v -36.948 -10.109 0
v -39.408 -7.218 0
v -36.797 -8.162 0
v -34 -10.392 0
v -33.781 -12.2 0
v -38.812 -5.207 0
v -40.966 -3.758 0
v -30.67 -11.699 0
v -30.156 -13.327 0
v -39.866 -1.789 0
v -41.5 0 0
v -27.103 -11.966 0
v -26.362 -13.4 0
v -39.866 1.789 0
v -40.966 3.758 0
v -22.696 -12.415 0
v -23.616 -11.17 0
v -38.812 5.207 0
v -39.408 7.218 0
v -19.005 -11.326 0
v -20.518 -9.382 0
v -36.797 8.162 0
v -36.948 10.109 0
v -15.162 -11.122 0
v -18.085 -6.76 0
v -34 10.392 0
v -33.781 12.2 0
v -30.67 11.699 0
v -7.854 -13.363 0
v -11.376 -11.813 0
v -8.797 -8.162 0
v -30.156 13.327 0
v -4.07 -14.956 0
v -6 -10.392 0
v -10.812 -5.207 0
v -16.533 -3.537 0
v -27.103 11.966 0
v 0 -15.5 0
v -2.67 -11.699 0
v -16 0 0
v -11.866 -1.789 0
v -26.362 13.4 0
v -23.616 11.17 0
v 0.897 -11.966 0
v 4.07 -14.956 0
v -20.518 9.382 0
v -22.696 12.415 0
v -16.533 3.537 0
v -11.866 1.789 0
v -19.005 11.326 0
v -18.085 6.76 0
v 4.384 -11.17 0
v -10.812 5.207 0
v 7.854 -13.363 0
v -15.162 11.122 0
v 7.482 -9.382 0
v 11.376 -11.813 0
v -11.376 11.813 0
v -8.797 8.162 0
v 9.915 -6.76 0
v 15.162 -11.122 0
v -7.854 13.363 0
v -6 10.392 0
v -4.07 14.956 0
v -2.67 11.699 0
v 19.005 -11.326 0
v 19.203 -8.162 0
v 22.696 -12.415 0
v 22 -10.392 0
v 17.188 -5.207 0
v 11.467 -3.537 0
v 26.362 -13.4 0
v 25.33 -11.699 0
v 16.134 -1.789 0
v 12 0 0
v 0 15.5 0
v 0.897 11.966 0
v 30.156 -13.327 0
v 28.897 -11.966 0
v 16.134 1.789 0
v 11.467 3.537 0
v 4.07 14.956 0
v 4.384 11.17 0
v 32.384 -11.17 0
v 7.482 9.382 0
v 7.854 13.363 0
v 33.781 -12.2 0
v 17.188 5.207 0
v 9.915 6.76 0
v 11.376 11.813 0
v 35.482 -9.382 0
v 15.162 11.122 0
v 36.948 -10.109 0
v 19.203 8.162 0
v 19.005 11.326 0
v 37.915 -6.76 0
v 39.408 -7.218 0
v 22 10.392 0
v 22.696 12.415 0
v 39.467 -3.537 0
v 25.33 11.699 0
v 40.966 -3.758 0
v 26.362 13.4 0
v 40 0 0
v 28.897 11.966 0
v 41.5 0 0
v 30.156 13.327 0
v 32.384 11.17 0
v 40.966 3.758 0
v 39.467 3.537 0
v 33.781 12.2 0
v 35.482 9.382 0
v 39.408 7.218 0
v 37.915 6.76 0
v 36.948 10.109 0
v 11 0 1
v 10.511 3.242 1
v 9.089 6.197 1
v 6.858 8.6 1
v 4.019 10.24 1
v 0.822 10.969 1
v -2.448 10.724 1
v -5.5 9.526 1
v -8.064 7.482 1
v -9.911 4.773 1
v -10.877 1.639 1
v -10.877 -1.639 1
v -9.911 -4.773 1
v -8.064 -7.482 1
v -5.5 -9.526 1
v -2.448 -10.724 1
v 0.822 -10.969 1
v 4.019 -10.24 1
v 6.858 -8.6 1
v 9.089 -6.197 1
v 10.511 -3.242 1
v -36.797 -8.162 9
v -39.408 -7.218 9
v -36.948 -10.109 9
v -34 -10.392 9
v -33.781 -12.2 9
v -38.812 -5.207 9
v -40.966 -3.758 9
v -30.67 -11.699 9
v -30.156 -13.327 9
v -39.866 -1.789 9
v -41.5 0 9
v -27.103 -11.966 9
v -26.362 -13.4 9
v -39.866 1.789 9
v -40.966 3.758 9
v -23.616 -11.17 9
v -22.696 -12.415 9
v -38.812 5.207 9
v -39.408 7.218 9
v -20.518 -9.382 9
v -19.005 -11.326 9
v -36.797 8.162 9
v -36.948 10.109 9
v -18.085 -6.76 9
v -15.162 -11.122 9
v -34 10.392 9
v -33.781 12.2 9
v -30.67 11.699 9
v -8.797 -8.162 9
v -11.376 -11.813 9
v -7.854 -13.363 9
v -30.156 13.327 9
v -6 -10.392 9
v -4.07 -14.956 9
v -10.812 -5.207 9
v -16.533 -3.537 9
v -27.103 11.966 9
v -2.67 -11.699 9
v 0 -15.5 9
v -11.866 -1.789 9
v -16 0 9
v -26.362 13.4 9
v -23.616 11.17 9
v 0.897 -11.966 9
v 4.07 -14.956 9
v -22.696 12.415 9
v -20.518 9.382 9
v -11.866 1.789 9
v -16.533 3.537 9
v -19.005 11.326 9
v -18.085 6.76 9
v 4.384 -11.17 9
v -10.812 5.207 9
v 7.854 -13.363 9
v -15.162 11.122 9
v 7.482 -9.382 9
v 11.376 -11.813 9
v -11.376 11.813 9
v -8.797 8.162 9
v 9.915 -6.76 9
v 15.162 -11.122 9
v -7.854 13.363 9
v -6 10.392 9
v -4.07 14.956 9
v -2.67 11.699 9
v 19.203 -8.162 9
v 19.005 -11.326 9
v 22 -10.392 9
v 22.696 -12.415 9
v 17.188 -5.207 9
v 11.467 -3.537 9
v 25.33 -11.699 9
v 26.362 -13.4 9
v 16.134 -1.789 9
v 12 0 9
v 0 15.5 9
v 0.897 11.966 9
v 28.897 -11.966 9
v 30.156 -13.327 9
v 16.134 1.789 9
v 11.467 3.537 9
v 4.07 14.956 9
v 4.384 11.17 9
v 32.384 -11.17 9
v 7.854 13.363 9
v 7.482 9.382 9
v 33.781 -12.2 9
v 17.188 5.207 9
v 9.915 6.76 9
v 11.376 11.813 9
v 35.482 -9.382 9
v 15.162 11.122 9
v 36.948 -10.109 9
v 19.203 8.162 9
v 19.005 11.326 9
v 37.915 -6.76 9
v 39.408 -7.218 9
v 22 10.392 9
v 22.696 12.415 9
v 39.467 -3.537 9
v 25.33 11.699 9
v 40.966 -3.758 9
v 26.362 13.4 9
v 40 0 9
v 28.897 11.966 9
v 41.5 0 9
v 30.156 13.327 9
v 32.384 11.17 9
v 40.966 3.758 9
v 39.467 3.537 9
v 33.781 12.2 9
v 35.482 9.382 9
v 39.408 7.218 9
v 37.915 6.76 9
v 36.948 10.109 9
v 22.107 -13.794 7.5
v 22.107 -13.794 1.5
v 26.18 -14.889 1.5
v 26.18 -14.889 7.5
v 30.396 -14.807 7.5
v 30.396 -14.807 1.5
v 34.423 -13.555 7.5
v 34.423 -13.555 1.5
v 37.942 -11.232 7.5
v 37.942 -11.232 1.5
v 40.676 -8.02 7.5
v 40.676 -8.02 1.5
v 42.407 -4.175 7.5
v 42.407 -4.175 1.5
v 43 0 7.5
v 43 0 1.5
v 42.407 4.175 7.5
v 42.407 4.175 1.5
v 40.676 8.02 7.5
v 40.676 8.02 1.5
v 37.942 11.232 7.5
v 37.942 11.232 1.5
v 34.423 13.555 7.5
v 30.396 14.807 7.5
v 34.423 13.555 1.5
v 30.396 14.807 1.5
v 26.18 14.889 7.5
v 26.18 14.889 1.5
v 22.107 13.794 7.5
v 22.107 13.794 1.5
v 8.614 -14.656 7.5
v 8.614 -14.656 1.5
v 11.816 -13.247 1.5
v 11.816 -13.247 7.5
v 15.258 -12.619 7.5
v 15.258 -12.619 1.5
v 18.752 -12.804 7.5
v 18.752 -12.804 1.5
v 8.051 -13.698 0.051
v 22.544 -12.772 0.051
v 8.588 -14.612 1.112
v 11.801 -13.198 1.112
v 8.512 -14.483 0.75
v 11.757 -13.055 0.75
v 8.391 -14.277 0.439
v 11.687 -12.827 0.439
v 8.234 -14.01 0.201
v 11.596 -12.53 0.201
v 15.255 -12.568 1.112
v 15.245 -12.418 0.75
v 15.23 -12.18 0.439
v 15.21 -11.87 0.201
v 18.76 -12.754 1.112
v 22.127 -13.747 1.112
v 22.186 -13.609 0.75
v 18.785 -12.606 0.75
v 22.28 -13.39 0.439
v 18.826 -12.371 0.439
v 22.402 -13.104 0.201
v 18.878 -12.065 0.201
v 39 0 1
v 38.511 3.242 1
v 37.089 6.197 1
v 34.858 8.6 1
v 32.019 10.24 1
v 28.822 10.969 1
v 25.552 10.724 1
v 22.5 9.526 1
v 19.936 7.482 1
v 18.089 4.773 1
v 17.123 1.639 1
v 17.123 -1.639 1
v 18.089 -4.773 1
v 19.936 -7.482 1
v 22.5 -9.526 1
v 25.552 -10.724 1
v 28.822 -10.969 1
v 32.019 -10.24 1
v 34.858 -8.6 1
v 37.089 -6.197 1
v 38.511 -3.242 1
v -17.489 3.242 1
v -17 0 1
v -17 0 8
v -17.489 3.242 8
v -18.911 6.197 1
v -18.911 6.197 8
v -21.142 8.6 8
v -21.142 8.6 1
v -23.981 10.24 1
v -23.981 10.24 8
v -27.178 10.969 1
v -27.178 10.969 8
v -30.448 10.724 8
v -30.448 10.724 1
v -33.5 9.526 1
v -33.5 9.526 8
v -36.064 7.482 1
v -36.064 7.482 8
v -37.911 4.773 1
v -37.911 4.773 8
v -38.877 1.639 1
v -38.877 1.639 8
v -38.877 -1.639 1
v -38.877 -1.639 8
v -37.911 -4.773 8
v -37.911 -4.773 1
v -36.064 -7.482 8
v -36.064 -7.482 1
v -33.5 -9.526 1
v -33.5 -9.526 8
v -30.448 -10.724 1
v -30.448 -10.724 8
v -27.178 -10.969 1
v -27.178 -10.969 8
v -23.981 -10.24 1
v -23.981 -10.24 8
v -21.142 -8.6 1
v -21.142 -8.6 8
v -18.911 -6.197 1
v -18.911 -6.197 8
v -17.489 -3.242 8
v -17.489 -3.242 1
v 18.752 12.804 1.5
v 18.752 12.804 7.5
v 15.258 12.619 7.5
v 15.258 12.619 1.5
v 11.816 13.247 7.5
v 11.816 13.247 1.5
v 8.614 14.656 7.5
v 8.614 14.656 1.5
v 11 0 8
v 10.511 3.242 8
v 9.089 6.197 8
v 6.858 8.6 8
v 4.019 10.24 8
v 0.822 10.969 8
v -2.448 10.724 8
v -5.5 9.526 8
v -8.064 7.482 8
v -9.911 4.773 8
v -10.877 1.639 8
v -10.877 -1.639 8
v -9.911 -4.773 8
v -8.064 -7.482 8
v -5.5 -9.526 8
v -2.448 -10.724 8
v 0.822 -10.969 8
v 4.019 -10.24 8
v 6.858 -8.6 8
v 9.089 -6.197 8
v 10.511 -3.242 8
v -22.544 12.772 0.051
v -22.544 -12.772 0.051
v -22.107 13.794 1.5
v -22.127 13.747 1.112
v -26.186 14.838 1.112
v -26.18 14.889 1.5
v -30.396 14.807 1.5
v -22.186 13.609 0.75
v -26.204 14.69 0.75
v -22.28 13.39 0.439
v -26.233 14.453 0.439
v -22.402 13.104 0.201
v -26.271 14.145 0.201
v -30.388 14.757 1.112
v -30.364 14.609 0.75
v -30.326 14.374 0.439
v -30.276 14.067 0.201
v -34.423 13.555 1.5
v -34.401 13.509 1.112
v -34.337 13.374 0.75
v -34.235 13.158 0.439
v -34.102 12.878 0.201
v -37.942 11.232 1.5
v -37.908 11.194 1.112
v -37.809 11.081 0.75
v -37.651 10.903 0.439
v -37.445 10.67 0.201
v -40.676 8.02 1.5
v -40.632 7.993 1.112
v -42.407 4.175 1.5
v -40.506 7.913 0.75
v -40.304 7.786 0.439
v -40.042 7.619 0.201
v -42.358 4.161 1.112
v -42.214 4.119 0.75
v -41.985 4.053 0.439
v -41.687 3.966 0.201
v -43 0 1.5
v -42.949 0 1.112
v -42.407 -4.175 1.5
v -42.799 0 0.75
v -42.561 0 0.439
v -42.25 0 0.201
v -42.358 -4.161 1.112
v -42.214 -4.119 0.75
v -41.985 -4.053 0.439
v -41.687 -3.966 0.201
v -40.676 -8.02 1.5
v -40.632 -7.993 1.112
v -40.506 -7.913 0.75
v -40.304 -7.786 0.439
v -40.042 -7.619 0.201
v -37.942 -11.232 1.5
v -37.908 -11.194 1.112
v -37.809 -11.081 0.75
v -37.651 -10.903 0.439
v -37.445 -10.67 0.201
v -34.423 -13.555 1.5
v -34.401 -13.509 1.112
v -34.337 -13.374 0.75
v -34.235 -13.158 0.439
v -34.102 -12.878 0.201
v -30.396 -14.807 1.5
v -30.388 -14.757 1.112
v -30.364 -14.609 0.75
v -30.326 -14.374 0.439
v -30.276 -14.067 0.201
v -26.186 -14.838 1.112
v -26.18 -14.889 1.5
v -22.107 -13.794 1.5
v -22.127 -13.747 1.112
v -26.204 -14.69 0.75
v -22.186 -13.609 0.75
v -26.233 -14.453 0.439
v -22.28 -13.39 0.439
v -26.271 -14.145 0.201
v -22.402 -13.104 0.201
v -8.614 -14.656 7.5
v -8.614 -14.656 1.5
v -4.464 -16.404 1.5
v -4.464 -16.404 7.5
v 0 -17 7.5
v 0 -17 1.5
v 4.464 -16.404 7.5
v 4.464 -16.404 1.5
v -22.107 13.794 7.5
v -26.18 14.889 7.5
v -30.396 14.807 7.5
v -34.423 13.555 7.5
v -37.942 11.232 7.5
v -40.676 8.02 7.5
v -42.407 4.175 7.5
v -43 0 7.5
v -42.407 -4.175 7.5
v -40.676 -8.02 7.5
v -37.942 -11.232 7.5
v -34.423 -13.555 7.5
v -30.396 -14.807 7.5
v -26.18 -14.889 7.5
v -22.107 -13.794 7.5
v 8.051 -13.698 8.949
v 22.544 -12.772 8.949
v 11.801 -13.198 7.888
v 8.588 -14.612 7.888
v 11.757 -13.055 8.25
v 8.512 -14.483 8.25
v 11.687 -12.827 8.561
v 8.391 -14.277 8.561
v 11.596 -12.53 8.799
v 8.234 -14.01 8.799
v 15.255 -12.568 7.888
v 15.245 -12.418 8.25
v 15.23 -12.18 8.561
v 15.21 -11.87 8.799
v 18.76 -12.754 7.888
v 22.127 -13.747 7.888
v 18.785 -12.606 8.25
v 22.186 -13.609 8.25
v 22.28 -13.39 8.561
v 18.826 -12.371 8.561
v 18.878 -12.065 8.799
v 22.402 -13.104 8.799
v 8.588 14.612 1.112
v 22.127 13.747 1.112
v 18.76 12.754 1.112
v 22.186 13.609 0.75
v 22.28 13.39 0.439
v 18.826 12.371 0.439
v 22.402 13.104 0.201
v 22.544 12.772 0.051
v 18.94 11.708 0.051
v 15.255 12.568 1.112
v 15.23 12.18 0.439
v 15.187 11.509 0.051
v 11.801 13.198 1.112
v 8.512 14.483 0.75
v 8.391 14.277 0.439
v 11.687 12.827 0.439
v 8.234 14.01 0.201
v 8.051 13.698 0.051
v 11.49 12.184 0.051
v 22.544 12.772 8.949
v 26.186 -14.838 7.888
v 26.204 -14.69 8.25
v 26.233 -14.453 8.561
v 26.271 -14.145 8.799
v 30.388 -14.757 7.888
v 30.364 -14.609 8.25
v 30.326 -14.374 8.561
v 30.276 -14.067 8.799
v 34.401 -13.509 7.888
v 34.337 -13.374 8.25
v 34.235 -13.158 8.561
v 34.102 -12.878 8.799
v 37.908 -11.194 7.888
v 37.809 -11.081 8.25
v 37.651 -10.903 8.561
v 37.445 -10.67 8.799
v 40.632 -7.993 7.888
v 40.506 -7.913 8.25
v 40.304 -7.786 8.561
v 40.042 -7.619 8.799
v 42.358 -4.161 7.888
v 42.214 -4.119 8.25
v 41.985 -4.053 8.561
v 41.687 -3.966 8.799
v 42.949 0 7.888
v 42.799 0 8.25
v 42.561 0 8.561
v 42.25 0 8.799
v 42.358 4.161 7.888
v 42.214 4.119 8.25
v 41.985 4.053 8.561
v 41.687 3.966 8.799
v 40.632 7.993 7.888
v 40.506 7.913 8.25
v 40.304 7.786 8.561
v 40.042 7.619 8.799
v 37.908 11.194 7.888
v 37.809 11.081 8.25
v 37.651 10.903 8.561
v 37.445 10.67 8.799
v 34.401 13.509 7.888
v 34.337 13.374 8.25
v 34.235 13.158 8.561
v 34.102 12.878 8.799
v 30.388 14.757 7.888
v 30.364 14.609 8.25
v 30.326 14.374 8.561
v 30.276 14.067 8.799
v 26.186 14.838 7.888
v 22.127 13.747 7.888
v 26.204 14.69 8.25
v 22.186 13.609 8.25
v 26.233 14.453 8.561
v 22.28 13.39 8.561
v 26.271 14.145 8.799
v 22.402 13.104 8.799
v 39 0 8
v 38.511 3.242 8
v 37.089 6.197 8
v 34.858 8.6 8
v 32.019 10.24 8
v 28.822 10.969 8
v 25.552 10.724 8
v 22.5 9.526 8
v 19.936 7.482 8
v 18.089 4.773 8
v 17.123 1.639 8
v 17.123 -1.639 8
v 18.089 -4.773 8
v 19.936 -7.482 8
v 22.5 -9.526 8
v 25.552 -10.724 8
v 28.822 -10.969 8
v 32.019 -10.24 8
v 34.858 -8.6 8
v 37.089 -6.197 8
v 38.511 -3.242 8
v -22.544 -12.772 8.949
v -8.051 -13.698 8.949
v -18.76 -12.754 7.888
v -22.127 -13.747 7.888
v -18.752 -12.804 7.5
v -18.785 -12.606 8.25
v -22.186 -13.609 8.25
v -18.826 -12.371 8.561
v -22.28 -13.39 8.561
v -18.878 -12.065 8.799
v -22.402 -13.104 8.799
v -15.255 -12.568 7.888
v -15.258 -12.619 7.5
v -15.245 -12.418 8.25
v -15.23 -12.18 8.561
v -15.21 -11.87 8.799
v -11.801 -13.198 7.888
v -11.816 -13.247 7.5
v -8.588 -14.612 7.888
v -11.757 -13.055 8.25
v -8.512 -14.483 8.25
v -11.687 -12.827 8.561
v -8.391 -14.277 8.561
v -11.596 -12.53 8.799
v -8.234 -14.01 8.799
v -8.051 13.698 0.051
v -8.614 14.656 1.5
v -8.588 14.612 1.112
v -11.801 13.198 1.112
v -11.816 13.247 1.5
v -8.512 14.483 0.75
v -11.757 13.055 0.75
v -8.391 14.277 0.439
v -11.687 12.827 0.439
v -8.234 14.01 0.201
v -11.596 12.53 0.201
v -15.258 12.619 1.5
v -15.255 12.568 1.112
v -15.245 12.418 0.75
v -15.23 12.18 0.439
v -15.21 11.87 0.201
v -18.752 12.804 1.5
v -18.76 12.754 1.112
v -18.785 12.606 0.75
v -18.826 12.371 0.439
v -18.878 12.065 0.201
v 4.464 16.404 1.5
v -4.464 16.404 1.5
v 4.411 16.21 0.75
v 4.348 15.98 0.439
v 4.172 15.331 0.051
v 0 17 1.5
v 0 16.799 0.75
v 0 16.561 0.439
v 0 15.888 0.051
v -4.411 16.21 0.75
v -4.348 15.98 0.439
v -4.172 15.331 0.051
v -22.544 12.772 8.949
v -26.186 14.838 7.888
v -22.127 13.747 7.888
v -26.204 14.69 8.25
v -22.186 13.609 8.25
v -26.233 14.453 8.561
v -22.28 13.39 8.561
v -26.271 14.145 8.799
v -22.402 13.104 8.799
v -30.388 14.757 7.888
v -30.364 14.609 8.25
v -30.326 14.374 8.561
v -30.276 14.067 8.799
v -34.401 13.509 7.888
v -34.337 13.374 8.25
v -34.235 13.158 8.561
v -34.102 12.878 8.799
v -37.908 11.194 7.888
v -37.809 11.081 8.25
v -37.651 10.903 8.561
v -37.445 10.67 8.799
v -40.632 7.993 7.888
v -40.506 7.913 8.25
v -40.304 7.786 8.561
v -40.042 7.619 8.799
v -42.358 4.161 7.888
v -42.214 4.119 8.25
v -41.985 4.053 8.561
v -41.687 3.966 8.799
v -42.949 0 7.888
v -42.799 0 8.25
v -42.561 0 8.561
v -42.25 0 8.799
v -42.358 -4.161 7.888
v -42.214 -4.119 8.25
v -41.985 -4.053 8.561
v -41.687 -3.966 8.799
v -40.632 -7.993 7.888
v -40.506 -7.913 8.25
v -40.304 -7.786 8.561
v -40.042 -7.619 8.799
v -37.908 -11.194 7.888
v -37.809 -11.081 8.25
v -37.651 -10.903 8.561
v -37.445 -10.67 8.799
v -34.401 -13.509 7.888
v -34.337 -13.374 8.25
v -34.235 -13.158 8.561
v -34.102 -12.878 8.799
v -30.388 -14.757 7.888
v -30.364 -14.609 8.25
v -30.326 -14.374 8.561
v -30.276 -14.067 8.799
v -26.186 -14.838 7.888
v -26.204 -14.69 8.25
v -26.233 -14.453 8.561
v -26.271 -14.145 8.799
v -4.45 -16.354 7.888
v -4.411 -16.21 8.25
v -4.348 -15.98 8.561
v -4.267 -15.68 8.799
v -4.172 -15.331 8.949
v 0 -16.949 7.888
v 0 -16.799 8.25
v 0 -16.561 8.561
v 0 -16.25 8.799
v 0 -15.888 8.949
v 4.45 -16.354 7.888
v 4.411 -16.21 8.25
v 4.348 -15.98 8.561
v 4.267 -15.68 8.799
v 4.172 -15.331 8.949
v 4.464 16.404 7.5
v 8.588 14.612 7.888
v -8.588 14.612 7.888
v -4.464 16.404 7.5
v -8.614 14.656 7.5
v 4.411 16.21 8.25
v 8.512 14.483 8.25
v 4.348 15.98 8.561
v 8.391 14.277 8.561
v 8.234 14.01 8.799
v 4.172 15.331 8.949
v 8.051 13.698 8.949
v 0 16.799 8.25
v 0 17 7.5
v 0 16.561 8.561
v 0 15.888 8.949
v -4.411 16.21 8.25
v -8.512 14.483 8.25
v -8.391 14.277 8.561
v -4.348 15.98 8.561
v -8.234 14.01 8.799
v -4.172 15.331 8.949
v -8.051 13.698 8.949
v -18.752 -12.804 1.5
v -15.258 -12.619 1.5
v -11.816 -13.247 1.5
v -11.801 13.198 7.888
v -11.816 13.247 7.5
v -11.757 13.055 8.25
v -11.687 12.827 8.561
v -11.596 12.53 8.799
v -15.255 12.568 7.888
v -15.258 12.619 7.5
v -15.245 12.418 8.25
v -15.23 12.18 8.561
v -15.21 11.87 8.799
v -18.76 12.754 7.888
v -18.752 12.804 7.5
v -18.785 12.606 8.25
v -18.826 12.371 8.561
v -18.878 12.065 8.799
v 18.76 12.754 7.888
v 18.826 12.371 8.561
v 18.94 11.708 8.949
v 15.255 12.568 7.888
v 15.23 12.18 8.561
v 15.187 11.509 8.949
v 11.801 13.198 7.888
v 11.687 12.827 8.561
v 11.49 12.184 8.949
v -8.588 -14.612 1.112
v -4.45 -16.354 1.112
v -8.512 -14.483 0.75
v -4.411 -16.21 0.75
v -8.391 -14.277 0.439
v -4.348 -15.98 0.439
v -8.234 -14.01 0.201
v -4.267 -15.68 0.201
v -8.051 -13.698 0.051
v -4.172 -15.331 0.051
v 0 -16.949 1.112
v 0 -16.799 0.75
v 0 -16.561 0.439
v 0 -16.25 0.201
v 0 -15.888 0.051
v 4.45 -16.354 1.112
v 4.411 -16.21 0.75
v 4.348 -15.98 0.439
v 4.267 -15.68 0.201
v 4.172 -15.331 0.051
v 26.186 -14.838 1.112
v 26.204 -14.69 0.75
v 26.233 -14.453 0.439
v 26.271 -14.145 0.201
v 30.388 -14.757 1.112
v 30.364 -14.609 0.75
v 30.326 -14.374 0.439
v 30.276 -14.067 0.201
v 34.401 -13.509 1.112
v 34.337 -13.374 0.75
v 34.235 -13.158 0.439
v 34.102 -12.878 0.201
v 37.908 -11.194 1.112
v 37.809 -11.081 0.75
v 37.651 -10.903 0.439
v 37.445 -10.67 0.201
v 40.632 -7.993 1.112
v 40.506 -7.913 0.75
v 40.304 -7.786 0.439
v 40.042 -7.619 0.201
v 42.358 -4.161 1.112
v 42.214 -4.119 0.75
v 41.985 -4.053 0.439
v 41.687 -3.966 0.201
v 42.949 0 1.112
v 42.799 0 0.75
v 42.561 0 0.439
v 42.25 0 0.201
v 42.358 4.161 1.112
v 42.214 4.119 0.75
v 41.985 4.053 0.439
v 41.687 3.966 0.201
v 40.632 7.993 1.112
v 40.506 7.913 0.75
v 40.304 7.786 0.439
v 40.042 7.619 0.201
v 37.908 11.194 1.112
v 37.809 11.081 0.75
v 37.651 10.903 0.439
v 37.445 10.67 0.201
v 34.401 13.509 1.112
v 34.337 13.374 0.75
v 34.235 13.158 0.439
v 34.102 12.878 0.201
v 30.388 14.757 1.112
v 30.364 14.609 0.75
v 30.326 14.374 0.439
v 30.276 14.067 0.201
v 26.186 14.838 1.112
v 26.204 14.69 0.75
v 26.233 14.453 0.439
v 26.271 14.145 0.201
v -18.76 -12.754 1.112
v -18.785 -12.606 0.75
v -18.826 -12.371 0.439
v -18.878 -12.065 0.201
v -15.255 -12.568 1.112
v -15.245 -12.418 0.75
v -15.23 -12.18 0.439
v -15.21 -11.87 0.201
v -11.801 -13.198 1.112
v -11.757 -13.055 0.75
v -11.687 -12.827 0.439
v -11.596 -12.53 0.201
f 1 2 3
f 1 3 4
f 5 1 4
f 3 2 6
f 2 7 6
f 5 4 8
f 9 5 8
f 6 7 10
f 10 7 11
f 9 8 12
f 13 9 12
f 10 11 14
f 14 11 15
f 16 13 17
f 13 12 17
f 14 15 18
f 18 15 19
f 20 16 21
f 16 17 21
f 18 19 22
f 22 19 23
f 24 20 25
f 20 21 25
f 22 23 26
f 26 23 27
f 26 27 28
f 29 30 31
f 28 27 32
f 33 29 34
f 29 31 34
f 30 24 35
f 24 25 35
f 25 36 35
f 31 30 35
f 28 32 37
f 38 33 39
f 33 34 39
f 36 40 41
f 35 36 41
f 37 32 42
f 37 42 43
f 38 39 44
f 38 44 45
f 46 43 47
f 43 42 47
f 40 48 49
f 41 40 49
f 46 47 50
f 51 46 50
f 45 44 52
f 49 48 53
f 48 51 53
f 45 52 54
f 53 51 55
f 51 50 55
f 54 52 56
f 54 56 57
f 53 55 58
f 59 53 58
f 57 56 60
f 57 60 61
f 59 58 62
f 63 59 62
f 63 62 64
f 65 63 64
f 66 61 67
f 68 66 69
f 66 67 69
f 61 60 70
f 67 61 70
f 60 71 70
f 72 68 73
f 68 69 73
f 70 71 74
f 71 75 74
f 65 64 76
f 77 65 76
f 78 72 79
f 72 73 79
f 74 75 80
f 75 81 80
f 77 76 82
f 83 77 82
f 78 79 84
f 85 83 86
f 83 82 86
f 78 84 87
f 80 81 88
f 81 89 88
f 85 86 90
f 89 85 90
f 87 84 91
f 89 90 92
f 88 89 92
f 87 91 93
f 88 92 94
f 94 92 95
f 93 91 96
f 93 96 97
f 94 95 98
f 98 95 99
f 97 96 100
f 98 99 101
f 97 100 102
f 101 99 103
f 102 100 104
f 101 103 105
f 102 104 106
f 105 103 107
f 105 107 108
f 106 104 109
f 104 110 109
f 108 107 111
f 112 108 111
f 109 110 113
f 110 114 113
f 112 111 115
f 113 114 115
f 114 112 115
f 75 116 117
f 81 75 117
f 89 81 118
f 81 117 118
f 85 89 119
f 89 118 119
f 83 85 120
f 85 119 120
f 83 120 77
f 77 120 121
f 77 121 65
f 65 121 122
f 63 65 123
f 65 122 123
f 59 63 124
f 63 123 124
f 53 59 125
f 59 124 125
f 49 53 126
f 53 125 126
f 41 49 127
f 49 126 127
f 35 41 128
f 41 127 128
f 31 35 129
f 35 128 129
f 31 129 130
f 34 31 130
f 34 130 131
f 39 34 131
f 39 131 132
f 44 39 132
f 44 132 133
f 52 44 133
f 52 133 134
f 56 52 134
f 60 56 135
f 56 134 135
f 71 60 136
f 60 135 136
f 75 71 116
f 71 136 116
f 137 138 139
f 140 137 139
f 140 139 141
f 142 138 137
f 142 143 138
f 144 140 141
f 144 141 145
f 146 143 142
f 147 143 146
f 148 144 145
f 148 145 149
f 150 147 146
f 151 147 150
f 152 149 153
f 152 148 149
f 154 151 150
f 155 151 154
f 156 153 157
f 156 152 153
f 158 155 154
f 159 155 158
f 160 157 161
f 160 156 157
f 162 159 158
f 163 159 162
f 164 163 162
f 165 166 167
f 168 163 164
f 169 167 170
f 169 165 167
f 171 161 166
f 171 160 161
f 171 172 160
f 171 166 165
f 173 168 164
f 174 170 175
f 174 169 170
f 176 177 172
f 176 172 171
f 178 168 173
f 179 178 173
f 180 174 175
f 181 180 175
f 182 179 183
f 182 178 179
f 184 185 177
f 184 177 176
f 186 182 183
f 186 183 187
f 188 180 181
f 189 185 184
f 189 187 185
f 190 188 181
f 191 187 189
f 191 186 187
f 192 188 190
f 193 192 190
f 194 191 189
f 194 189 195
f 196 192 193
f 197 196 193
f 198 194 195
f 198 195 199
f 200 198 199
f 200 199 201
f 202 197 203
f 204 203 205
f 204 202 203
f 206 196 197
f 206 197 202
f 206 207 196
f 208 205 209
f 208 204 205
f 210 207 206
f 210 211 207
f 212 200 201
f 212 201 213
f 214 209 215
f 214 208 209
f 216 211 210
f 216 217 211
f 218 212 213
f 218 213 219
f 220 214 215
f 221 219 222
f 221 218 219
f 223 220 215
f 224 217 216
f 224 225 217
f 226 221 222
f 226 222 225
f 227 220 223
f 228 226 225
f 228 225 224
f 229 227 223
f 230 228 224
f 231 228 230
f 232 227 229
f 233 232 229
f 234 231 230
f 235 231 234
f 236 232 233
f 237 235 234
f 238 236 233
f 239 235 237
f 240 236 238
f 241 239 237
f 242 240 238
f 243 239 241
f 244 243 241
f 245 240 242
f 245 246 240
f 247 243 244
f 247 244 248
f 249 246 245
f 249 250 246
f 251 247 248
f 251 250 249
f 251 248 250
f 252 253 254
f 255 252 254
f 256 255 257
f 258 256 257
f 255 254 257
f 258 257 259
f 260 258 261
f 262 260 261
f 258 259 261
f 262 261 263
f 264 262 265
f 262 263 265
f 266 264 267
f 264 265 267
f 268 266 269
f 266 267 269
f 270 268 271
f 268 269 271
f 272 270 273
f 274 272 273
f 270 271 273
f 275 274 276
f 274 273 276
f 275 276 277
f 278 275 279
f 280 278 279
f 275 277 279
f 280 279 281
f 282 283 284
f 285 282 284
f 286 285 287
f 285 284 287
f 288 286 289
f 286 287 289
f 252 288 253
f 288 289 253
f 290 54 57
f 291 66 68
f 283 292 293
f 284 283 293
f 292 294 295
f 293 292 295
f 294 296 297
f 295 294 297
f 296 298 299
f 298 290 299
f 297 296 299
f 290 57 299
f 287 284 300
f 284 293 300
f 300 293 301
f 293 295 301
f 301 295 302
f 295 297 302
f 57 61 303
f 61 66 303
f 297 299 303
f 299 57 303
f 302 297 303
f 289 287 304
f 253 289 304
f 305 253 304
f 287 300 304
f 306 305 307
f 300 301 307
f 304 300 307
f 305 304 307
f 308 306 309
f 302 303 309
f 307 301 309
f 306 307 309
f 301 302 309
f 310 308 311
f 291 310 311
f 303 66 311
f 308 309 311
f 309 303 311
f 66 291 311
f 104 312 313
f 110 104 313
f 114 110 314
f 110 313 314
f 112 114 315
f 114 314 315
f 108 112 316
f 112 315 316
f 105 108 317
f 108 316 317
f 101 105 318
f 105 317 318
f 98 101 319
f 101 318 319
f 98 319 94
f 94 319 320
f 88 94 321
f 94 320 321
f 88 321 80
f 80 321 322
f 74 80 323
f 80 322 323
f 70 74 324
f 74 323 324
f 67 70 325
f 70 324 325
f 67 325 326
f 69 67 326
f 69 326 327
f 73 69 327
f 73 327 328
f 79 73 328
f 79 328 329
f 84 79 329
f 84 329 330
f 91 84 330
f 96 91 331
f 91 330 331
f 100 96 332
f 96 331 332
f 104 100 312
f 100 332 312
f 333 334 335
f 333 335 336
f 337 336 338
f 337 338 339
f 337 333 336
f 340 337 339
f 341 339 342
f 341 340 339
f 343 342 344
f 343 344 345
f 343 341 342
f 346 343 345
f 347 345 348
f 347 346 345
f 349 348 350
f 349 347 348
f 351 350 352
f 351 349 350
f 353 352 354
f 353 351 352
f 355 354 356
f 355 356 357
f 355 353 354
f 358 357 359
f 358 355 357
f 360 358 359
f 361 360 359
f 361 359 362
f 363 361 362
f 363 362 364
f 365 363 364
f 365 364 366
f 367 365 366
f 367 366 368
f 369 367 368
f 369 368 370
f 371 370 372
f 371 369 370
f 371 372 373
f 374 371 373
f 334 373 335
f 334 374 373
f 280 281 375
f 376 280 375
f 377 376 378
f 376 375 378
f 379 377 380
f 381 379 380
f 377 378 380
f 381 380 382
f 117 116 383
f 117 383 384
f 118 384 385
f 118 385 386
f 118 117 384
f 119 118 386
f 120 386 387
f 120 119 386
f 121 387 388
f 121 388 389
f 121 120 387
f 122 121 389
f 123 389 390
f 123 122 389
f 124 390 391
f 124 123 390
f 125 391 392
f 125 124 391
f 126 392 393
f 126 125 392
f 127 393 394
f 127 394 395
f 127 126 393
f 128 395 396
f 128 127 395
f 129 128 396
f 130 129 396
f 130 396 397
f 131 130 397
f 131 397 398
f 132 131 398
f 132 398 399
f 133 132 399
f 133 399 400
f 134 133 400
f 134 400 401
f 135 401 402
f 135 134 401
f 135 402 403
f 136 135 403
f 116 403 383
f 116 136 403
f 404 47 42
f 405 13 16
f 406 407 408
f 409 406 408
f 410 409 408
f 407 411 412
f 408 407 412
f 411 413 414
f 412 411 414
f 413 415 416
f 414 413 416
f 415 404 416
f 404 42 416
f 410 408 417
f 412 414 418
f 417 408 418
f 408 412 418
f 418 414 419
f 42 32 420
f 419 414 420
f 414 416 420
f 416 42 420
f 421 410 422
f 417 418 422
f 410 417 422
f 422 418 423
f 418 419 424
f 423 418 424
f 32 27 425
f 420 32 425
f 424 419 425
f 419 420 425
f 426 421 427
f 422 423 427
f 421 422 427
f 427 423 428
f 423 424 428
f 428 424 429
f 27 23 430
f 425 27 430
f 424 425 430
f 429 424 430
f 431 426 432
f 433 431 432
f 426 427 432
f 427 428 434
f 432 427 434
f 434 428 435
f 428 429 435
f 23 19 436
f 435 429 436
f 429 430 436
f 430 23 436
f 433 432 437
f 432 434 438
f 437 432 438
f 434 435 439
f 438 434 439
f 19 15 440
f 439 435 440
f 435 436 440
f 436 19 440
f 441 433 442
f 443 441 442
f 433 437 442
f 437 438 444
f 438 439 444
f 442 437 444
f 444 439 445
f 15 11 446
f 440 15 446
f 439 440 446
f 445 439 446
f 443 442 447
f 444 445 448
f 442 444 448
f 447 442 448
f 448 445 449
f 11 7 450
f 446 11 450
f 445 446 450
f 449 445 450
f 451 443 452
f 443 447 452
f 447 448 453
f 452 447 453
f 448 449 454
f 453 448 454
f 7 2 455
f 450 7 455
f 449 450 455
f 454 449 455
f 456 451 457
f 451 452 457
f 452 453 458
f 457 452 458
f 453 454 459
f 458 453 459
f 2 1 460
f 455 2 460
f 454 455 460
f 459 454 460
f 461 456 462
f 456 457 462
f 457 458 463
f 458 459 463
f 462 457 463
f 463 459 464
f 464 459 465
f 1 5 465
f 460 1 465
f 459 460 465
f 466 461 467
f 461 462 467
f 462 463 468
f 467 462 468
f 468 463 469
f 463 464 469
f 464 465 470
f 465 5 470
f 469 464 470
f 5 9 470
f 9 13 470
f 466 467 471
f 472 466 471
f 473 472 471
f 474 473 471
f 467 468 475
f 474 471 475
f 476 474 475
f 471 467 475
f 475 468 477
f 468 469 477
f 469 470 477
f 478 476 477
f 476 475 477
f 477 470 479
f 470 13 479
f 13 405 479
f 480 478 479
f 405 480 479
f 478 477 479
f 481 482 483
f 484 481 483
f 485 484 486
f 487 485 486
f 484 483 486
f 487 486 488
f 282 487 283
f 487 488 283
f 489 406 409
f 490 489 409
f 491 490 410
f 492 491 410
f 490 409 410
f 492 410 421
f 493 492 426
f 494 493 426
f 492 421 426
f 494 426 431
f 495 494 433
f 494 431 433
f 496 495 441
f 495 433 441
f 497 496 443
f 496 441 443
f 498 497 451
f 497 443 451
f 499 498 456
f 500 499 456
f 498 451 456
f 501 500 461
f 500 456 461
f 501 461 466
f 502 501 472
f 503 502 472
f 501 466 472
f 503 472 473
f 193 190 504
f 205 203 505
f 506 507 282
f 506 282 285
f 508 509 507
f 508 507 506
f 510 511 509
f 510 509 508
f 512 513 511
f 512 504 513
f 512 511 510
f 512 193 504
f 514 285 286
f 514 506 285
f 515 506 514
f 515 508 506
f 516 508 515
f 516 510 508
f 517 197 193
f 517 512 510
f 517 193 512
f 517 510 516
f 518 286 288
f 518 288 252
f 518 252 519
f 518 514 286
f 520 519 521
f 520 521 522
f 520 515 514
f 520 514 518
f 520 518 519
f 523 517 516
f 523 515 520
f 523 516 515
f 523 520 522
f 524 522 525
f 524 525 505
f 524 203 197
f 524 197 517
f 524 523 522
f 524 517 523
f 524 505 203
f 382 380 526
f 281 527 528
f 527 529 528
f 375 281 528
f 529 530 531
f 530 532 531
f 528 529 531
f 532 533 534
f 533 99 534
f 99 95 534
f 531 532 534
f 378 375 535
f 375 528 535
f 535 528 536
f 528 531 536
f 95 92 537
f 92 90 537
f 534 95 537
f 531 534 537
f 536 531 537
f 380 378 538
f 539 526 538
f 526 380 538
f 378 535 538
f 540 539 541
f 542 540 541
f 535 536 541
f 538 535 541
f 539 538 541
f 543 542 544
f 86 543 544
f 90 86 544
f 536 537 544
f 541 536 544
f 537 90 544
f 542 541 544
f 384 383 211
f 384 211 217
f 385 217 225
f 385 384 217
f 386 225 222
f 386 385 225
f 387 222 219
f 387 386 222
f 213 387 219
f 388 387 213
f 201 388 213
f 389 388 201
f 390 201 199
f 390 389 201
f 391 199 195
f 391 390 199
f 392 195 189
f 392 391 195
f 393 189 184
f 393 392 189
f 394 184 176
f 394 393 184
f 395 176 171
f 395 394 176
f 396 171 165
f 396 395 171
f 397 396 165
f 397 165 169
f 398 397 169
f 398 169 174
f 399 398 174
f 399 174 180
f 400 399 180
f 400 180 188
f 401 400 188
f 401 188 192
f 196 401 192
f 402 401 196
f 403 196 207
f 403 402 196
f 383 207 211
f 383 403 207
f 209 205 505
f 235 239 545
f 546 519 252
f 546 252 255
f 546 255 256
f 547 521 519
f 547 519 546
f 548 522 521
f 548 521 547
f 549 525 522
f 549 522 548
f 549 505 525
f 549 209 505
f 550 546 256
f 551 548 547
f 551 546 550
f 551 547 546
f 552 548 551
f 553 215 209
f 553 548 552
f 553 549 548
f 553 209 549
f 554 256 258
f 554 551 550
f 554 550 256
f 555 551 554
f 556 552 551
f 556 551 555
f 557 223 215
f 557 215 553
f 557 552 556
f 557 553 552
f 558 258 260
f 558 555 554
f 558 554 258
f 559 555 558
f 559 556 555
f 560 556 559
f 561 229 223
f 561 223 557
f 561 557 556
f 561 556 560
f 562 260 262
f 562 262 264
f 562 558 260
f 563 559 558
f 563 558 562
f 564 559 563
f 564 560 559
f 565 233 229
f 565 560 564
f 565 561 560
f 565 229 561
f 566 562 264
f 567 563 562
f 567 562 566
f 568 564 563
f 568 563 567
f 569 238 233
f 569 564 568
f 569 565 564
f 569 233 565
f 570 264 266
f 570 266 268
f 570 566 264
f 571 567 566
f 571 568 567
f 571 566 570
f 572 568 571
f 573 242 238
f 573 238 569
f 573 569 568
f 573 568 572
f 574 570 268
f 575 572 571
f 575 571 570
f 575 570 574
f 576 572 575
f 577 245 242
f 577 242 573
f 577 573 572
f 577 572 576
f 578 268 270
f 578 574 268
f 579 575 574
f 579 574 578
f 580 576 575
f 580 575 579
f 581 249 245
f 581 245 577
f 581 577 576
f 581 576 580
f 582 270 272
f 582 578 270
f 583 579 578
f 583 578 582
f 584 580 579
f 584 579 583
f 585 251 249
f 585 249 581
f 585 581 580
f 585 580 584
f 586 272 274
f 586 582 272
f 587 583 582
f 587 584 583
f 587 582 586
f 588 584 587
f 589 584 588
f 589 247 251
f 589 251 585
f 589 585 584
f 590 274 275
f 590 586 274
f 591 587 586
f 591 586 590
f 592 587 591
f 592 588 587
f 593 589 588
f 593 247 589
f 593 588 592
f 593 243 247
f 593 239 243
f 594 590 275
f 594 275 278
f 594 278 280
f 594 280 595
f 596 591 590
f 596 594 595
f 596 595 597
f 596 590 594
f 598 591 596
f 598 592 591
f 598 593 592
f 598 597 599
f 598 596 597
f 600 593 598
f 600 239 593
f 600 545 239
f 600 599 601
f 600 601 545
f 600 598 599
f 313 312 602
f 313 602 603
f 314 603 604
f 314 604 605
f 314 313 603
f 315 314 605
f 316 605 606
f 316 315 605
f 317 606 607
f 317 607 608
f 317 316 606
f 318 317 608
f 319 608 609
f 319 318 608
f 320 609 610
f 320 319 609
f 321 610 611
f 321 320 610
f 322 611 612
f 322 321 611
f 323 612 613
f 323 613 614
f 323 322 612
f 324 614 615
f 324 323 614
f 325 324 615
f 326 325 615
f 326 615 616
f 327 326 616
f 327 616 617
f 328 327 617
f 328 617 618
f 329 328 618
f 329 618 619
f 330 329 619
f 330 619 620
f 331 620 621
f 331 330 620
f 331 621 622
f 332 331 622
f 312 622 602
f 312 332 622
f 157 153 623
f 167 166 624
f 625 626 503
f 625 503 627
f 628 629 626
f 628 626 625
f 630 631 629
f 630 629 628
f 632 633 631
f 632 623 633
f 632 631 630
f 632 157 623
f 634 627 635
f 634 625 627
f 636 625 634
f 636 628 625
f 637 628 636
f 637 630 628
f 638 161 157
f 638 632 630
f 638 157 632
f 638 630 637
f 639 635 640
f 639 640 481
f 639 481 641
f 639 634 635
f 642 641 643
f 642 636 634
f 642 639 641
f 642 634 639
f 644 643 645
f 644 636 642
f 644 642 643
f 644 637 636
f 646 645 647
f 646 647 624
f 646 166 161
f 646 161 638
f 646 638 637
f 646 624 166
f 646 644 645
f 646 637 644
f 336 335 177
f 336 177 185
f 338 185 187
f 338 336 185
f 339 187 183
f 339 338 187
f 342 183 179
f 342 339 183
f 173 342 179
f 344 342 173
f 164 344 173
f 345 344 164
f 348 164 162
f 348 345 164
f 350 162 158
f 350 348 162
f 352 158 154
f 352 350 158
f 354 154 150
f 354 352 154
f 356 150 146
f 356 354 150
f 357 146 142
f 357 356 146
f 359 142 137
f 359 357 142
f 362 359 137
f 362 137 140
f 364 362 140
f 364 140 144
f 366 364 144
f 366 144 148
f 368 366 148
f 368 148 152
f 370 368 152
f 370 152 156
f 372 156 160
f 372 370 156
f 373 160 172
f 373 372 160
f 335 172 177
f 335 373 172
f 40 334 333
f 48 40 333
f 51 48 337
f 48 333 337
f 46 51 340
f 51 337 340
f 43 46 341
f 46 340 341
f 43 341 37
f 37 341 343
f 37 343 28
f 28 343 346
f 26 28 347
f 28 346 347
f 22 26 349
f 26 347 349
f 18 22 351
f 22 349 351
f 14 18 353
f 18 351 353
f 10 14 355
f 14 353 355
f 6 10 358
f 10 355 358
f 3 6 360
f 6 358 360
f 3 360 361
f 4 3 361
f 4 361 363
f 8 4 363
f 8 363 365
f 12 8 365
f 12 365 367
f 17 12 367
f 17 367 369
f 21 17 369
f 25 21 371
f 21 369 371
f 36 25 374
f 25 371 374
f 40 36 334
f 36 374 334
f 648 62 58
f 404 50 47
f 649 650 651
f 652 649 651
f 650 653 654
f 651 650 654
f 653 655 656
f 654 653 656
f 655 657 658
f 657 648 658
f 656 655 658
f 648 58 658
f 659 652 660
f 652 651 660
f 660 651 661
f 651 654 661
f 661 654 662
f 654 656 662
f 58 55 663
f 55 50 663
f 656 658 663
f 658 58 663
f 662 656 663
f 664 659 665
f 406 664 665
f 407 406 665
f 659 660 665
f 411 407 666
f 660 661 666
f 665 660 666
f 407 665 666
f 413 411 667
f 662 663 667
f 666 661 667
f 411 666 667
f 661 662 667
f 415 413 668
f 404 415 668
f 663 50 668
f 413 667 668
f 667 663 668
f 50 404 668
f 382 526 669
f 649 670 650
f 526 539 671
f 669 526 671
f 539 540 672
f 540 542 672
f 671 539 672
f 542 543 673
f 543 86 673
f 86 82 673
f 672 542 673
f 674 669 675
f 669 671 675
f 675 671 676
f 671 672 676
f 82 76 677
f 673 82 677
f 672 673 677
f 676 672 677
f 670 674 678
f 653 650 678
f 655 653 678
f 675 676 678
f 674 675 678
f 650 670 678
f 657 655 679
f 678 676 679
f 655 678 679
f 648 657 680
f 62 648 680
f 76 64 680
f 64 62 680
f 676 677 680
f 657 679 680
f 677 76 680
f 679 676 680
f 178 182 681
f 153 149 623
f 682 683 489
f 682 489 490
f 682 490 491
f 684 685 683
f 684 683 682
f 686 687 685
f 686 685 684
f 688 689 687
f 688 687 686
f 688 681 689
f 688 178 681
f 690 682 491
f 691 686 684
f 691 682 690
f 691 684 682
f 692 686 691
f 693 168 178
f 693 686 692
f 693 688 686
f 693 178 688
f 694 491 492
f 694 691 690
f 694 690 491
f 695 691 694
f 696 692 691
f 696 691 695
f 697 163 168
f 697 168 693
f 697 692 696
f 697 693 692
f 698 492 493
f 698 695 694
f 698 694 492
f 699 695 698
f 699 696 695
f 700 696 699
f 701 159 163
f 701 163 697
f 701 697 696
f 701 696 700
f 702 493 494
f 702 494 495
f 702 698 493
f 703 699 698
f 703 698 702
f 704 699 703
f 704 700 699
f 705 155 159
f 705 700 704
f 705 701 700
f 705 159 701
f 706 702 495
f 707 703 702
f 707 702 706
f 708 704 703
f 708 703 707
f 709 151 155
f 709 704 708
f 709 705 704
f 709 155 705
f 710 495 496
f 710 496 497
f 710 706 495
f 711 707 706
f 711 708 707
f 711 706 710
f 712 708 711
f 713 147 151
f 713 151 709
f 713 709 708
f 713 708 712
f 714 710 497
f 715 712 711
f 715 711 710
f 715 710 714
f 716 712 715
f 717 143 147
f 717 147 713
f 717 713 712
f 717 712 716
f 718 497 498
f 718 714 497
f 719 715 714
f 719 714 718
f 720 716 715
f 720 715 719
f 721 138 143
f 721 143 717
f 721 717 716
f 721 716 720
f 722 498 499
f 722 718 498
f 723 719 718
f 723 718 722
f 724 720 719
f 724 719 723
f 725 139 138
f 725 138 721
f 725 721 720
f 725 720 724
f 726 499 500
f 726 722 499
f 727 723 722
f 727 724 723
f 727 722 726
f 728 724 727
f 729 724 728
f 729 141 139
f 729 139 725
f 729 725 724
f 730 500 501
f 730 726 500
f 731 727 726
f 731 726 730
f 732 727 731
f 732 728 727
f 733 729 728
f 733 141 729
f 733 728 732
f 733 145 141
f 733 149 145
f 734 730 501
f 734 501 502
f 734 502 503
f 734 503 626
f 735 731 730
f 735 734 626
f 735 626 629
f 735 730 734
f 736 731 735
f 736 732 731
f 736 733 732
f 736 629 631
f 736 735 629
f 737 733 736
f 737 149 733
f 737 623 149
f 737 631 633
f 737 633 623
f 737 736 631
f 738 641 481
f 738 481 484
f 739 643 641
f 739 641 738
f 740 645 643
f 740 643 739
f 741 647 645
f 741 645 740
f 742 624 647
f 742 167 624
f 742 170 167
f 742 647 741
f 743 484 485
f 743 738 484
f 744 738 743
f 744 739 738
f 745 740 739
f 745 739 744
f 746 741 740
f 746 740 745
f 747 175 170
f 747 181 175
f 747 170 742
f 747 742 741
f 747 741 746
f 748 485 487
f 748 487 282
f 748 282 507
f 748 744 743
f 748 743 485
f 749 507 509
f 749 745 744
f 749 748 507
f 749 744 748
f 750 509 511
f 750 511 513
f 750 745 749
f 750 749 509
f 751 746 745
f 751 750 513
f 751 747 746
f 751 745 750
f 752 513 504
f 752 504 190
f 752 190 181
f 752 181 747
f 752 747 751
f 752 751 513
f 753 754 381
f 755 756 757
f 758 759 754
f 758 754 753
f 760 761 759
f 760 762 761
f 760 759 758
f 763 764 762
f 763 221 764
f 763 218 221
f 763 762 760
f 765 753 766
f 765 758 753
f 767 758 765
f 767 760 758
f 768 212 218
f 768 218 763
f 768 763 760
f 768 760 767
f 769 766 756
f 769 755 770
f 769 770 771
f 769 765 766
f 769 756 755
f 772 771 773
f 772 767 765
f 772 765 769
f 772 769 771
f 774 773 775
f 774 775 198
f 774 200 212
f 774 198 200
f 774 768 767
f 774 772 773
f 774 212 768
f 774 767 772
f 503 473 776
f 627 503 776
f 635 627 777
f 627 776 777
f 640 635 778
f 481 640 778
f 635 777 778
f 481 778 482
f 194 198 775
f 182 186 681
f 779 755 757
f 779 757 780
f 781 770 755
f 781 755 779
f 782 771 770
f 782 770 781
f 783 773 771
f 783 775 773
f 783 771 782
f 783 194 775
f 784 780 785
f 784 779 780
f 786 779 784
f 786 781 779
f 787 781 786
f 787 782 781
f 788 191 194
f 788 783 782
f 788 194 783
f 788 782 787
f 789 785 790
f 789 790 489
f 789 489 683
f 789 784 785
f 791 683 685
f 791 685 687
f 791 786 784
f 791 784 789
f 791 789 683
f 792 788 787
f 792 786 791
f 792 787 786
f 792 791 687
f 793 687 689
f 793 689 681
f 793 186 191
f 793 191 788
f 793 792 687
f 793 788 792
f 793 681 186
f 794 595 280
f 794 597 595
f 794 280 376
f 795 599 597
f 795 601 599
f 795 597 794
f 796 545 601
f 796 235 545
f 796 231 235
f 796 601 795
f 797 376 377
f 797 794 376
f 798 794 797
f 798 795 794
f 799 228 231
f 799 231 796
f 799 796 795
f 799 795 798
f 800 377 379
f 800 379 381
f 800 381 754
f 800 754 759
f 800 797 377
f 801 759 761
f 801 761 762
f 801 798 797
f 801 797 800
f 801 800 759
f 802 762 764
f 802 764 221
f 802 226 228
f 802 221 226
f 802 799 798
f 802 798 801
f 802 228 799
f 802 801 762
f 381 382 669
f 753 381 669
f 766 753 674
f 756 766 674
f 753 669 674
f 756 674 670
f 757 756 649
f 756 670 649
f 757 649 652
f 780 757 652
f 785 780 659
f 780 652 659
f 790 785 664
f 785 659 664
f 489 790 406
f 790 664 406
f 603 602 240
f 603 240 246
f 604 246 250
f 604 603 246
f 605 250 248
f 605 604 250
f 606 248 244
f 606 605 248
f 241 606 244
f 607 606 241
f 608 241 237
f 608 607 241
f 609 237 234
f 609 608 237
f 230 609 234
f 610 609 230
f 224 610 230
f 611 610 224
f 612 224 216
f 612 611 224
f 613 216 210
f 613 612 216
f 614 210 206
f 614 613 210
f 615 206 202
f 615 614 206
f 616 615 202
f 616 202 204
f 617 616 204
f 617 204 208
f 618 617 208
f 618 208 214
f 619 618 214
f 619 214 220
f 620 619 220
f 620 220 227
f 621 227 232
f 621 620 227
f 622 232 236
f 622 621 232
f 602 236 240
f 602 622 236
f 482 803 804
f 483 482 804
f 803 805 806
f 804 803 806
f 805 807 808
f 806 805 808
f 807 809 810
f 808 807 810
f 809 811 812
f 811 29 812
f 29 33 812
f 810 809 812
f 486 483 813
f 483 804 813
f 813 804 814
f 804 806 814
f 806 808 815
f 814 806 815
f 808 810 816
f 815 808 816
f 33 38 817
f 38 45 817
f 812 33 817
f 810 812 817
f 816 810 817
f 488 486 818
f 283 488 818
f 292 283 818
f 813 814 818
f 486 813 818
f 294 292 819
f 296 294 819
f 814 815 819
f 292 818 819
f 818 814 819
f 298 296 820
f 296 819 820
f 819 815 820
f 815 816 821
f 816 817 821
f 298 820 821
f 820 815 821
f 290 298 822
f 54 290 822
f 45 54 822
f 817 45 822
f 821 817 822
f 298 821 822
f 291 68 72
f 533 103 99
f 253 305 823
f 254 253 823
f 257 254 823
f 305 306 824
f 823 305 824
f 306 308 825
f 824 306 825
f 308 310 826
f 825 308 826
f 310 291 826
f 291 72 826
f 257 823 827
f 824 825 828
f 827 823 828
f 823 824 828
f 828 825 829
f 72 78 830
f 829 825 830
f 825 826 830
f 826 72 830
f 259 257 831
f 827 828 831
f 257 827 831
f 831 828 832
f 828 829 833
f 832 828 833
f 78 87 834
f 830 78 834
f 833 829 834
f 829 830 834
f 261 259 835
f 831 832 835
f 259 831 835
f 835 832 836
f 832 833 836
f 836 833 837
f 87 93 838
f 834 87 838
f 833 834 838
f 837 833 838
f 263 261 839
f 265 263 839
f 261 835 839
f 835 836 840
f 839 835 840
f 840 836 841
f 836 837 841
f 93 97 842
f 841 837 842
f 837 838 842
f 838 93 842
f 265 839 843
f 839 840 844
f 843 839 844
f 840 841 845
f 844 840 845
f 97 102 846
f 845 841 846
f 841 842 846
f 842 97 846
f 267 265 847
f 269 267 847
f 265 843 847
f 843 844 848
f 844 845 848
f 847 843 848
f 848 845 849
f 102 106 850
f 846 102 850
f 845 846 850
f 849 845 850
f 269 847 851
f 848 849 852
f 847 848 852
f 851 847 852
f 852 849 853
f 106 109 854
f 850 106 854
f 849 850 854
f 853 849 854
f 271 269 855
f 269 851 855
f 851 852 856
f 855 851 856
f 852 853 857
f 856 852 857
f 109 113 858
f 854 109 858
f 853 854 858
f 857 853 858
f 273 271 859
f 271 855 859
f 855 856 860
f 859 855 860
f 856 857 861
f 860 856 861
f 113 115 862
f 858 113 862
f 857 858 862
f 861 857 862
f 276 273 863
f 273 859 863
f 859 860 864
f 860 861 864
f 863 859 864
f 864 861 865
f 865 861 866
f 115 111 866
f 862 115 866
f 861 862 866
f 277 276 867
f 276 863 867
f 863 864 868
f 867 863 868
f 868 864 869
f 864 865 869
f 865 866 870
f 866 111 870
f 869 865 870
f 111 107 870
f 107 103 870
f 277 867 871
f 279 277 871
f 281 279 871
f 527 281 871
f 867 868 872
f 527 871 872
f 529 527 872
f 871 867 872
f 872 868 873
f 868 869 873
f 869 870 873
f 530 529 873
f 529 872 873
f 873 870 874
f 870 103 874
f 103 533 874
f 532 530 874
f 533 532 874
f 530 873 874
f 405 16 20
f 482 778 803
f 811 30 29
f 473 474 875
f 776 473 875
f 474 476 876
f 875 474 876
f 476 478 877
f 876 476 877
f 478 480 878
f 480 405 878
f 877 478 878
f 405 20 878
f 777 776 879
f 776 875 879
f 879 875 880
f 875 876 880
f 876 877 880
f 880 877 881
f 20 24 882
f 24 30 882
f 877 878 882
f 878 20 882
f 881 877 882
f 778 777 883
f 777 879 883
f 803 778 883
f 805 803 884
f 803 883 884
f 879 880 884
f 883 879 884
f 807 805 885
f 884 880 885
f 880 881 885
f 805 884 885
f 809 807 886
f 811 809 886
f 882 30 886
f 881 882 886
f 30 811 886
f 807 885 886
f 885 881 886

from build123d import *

# Parameters (mm, degrees)
F0_R     = 11
F1_DEPTH = 9
F2_R     = 1.5
F3_SIZE  = 1


with BuildPart() as f1:
    # F0 (on Top) → F1 (new body)
    with BuildSketch(Plane.XY):
        with BuildLine():
            ThreePointArc((-8.613839, 14.656117), (-15.257844, 12.618509), (-22.107143, 13.793993))
            ThreePointArc((-22.107143, 13.793993), (-43, 0), (-22.107143, -13.793993))
            ThreePointArc((-22.107143, -13.793993), (-15.257844, -12.618509), (-8.613839, -14.656117))
            ThreePointArc((-8.613839, -14.656117), (0, -17), (8.613839, -14.656117))
            ThreePointArc((8.613839, -14.656117), (15.257844, -12.618509), (22.107143, -13.793993))
            ThreePointArc((22.107143, -13.793993), (43, 0), (22.107143, 13.793993))
            ThreePointArc((22.107143, 13.793993), (15.257844, 12.618509), (8.613839, 14.656117))
            ThreePointArc((8.613839, 14.656117), (0, 17), (-8.613839, 14.656117))
        make_face()
        with Locations((-28, 0)):
            Circle(F0_R, mode=Mode.SUBTRACT)
        Circle(F0_R, mode=Mode.SUBTRACT)
        with Locations((28, 0)):
            Circle(F0_R, mode=Mode.SUBTRACT)
    extrude(amount=F1_DEPTH)

    # F2
    f2_edges = [f1.edges().sort_by_distance(p)[0] for p in [
        (0, 17, 0),
        (0, 17, 9),
    ]]
    fillet(f2_edges, radius=F2_R)

    # F3
    f3_edges = [f1.edges().sort_by_distance(p)[0] for p in [
        (-17, 0, 4.5),
        (-39, 0, 0),
        (-39, 0, 9),
        (11, 0, 4.5),
        (-11, 0, 0),
        (-11, 0, 9),
        (39, 0, 4.5),
        (17, 0, 0),
        (17, 0, 9),
    ]]
    chamfer(f3_edges, length=F3_SIZE)


solid = f1.part
